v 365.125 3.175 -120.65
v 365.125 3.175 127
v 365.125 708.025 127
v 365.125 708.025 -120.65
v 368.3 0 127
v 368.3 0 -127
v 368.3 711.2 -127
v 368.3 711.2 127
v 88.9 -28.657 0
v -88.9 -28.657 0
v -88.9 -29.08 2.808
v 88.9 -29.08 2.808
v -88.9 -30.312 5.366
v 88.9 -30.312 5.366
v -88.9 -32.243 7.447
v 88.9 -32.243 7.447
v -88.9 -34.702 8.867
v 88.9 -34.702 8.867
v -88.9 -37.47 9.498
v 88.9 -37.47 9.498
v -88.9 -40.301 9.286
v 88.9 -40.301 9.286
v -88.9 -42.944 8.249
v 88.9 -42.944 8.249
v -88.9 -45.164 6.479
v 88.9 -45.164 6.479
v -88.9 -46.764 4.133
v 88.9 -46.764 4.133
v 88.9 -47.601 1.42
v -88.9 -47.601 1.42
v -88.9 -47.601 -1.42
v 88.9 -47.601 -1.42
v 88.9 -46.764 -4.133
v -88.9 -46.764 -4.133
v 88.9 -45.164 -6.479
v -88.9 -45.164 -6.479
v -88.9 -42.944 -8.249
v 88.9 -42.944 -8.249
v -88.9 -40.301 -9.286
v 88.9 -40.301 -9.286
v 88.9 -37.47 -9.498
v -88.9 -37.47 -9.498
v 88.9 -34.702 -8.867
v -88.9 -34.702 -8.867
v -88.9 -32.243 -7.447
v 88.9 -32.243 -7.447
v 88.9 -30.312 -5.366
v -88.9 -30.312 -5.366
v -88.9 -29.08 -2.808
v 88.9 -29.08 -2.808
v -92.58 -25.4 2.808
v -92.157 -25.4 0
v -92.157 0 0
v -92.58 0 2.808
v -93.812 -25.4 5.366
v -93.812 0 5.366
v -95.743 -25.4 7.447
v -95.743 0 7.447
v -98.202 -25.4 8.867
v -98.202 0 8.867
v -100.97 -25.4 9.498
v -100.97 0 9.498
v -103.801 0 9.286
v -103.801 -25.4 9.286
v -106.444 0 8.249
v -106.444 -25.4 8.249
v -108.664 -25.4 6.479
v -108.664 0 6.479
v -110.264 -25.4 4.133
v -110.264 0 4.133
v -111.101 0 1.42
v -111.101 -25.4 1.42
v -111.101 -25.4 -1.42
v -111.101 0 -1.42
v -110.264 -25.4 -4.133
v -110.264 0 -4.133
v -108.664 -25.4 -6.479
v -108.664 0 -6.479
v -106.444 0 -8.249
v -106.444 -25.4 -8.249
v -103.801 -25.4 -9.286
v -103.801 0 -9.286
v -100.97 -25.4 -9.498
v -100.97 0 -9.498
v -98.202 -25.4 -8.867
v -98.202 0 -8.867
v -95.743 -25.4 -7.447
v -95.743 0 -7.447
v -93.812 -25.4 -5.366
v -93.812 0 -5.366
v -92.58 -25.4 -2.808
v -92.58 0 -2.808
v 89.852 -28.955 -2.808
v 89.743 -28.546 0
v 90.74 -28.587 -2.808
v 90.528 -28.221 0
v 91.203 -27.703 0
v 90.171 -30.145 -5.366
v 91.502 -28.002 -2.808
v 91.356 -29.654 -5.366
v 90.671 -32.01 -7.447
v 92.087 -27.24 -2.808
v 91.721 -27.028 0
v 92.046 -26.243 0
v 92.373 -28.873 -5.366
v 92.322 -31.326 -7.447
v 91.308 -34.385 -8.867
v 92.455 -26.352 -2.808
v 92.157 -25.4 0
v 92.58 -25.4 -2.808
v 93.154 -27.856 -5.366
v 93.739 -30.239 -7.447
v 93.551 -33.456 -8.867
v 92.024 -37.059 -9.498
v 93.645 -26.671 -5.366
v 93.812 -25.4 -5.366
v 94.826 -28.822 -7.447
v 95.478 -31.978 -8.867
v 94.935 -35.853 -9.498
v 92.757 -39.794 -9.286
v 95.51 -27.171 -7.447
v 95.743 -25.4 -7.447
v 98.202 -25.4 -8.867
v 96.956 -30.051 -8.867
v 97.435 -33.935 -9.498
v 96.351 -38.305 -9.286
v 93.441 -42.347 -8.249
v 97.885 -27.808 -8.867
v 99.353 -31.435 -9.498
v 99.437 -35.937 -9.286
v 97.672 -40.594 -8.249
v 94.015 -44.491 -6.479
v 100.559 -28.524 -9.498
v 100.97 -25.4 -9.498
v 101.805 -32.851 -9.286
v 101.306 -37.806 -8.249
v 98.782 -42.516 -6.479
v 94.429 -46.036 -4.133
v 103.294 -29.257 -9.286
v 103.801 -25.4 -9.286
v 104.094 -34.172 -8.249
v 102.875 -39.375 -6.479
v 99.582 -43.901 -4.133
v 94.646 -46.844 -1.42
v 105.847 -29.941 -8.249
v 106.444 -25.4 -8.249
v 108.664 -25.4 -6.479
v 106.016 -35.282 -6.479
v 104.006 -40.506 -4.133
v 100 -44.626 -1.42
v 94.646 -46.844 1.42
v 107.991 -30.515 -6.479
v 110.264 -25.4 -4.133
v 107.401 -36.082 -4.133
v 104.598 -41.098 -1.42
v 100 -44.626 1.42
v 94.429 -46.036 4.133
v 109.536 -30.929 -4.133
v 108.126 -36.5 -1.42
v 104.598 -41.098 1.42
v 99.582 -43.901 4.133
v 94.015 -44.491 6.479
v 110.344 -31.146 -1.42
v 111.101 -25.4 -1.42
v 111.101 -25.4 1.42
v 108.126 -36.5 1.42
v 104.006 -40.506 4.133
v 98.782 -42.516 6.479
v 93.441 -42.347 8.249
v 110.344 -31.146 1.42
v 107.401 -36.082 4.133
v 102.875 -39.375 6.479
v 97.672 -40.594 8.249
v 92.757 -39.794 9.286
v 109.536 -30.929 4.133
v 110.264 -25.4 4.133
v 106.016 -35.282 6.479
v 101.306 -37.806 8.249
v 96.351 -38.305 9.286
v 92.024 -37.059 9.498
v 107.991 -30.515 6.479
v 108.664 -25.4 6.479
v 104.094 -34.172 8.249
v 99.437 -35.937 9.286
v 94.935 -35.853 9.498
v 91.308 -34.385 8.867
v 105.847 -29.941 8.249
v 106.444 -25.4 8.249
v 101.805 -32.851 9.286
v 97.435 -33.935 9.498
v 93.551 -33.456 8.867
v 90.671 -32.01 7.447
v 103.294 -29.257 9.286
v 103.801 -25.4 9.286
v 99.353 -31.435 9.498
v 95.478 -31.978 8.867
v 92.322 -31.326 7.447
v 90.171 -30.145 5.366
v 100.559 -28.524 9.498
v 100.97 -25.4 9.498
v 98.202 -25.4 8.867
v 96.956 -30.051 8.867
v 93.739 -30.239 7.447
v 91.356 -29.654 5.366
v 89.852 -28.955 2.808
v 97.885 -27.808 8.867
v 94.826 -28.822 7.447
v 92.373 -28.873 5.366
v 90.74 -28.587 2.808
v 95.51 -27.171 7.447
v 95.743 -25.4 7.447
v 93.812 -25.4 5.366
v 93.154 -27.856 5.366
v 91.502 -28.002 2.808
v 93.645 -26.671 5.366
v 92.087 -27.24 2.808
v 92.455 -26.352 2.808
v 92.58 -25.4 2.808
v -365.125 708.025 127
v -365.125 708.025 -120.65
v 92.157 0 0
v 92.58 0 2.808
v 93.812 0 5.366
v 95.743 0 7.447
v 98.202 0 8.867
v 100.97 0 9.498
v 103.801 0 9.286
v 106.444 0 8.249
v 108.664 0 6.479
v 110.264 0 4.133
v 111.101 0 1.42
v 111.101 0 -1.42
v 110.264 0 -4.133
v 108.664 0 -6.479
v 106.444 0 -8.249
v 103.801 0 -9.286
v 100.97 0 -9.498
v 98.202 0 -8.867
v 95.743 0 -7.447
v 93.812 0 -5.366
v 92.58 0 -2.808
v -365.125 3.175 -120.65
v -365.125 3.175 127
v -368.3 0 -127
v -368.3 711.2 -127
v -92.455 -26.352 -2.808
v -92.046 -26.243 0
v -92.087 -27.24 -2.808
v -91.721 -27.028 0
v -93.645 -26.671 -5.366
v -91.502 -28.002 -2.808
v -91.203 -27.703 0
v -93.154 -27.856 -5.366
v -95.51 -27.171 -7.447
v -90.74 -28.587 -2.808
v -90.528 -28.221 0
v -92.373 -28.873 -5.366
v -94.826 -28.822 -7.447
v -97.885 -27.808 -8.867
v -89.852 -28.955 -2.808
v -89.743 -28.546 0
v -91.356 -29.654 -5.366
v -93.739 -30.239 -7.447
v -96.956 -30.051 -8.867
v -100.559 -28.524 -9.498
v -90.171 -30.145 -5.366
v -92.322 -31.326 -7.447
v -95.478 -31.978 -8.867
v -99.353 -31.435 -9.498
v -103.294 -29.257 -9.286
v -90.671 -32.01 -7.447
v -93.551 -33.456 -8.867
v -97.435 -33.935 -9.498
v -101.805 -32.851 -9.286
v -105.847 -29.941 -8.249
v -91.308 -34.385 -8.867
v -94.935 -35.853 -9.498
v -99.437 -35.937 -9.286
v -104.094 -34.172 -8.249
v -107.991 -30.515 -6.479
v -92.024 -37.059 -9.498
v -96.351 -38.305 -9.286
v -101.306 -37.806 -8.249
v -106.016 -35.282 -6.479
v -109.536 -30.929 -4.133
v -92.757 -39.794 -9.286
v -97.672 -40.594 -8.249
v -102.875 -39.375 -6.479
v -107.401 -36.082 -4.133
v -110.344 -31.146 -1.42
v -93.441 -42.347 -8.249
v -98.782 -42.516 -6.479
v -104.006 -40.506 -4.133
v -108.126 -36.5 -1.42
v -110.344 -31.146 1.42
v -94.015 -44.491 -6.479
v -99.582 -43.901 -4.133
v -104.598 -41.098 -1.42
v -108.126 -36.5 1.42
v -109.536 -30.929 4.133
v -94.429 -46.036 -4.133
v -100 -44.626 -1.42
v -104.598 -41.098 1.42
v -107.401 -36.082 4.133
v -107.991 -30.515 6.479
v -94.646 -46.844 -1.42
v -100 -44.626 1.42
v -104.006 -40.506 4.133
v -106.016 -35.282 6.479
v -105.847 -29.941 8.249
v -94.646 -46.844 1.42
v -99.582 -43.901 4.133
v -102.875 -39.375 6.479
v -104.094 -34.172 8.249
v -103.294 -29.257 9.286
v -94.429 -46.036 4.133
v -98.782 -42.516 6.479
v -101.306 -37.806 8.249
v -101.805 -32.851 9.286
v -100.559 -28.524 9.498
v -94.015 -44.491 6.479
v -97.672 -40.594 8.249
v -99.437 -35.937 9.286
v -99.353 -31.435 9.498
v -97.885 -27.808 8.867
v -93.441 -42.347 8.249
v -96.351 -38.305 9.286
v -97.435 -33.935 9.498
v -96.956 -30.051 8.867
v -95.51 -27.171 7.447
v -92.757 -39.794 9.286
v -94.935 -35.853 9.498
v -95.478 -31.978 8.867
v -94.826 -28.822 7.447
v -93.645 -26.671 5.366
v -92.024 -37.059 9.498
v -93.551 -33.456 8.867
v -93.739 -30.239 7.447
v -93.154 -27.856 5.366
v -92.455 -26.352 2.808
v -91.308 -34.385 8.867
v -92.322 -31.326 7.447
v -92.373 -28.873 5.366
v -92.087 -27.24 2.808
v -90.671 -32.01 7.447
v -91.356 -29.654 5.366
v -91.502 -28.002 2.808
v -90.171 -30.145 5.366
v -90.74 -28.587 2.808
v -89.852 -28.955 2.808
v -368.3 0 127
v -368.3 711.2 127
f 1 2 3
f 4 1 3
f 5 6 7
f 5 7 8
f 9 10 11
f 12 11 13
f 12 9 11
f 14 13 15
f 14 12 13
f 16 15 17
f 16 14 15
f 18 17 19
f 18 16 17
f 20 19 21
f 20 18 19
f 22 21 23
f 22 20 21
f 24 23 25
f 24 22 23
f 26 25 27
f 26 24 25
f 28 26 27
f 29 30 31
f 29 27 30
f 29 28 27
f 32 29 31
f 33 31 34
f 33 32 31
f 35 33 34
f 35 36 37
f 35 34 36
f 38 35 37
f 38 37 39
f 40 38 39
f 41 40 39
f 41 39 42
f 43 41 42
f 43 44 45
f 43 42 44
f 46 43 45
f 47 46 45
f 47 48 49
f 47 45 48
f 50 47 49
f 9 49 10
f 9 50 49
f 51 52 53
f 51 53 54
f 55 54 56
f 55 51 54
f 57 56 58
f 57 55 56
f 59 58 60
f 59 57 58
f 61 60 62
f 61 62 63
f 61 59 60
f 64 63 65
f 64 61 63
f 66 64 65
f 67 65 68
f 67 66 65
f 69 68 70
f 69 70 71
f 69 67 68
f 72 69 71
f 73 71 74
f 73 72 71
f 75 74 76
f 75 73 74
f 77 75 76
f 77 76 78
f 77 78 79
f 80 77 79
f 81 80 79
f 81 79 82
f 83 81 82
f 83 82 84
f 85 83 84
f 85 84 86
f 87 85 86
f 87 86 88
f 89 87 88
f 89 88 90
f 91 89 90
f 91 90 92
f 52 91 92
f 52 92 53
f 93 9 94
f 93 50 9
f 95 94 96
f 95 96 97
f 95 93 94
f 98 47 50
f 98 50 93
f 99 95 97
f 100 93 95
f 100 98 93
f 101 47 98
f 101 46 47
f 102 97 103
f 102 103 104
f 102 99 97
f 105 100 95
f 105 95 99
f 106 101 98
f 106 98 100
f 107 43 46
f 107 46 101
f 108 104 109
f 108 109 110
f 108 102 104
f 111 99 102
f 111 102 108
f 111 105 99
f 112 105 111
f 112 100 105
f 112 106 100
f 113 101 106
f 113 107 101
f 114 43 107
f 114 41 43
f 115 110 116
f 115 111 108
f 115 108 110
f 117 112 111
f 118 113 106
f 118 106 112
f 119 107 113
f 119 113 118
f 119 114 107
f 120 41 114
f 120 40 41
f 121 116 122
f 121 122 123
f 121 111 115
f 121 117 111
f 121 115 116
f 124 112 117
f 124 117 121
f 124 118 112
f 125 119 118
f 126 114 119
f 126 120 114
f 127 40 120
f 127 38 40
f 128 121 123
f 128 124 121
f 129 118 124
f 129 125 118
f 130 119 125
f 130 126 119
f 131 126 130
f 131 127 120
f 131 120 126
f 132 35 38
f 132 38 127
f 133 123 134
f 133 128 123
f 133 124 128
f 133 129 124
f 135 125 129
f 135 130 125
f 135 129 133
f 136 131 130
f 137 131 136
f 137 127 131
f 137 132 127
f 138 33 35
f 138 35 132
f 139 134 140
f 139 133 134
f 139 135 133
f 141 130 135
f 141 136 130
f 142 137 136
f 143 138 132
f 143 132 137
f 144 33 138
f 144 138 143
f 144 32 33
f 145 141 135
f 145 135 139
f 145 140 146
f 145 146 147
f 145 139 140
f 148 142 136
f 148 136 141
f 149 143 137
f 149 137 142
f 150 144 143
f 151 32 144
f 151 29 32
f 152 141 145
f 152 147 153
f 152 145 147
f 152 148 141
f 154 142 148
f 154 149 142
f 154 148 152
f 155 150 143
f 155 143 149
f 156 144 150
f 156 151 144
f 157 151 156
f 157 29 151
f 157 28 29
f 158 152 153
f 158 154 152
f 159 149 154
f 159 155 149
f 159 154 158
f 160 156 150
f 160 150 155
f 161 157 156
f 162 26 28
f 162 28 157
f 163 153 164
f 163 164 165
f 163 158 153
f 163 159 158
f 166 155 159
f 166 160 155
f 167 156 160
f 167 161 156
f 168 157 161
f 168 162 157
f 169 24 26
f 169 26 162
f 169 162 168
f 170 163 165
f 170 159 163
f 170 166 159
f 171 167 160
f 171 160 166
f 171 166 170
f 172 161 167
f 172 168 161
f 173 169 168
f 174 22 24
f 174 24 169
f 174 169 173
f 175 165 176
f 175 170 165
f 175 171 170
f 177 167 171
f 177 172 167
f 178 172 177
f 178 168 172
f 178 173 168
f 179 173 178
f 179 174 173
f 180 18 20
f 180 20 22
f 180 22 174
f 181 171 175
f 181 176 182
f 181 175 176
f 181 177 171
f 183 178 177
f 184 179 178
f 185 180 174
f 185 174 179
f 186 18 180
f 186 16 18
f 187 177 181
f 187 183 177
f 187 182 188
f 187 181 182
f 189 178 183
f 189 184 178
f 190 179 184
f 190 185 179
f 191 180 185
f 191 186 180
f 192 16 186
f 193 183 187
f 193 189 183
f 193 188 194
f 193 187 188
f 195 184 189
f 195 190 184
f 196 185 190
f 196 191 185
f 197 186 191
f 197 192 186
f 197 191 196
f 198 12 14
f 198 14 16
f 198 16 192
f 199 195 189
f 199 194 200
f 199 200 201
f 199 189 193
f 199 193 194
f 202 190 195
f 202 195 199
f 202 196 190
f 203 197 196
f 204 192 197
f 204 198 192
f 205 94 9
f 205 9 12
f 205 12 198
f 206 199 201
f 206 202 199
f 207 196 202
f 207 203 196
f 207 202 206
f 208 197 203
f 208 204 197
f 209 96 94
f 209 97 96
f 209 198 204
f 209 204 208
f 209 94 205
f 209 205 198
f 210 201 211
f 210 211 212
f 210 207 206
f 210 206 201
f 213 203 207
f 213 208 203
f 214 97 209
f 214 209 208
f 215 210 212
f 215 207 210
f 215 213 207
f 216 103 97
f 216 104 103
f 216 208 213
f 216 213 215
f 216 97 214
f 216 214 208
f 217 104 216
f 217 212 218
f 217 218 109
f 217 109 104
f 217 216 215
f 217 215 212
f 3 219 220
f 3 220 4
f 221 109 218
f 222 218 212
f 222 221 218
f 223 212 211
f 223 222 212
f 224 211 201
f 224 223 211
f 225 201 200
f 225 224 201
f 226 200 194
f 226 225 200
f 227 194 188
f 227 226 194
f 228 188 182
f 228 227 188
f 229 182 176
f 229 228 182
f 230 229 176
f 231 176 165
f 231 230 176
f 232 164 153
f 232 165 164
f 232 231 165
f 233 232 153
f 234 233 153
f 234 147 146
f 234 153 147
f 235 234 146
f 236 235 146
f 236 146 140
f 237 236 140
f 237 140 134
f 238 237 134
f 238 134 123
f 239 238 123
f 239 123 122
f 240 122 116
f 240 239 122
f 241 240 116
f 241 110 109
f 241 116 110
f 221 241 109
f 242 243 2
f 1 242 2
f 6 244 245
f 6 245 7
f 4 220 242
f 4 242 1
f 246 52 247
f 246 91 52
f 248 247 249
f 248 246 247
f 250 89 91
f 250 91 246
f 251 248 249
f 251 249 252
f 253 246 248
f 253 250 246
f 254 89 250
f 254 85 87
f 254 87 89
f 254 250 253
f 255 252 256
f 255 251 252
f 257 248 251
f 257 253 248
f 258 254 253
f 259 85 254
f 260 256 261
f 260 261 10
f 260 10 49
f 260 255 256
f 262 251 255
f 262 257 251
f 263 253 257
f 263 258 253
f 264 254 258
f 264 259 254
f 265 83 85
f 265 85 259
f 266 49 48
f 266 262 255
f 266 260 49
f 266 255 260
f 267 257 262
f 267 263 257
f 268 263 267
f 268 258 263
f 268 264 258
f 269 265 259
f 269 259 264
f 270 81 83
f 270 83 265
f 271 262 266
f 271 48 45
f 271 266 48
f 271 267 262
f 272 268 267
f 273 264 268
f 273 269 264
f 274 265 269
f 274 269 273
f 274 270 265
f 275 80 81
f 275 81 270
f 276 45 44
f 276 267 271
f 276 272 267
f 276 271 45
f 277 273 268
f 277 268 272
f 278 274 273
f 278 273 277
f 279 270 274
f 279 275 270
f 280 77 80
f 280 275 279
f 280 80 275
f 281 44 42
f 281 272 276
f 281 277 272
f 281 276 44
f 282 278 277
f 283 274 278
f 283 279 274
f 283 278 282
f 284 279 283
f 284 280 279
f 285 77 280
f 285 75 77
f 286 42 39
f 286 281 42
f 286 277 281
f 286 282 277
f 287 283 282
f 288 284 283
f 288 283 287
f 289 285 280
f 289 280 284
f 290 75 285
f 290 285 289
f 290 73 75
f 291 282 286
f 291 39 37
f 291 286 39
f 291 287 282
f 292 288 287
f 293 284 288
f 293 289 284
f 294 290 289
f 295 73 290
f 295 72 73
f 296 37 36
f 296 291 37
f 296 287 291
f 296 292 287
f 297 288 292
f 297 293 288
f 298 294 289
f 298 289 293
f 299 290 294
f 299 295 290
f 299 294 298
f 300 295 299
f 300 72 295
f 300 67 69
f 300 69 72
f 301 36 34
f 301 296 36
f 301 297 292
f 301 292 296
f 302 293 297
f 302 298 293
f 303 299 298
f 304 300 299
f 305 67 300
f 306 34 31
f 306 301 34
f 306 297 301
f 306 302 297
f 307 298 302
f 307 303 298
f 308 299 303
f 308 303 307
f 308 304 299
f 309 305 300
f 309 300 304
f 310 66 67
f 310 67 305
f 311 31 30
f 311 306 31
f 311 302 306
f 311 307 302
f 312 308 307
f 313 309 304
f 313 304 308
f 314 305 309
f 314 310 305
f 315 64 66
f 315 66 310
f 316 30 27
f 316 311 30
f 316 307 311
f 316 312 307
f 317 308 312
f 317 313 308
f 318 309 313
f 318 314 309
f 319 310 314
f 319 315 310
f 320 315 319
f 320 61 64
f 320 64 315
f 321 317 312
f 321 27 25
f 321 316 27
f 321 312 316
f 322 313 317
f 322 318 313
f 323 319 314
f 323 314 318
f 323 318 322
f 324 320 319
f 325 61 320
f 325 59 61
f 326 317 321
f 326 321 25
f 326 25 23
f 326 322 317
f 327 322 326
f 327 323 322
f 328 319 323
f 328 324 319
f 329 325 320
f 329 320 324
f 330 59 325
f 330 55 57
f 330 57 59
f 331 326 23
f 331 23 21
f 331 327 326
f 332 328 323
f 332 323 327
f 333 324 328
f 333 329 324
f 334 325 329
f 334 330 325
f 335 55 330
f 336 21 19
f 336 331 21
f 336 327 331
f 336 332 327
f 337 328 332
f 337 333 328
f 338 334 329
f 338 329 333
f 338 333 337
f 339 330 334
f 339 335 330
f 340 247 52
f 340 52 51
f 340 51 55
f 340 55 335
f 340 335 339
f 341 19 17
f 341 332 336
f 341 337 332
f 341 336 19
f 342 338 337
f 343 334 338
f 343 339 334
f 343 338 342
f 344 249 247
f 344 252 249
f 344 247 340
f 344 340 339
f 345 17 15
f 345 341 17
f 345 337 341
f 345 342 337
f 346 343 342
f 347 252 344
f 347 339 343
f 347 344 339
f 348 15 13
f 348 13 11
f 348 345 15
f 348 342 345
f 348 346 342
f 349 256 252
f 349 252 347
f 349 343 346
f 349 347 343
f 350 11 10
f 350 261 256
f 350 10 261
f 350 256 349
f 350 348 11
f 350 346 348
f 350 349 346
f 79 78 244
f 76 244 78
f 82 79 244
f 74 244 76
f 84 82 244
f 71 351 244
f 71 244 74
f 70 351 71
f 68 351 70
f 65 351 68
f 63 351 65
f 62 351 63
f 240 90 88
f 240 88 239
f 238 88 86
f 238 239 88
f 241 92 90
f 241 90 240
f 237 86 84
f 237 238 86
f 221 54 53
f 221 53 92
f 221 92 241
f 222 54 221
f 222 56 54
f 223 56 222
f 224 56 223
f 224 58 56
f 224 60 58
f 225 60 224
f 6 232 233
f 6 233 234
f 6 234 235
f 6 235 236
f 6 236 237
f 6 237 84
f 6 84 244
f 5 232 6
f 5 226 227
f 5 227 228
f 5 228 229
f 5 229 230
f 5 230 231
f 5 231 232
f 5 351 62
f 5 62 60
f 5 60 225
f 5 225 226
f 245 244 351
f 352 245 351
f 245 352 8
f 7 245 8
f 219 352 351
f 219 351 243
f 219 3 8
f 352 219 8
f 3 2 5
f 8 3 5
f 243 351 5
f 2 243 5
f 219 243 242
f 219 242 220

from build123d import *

# Parameters (mm, degrees)
F0_W     = 736.6
F0_H     = 254
F1_DEPTH = 711.2
F2_W     = 730.25
F2_H     = 704.85
F3_DEPTH = 247.65
F5_R     = 9.525


with BuildPart() as f1:
    # F0 (on Front) → F1 (new body)
    with BuildSketch(Plane.XZ):
        Rectangle(F0_W, F0_H)
    extrude(amount=-F1_DEPTH)

    # F2 (on face) → F3 (cut)
    with BuildSketch(Plane.XY.offset(127)):
        with Locations((0, 355.6)):
            Rectangle(F2_W, F2_H)
    extrude(amount=-F3_DEPTH, mode=Mode.SUBTRACT)

    # F6: sweep along a path in F4
    with BuildLine(Plane.XY) as f6_path:
        Line((-101.6, 0), (-101.6, -25.4))
        ThreePointArc((-101.6, -25.4), (-97.8802561211, -34.3802561211), (-88.9, -38.1))
        Line((-88.9, -38.1), (88.9, -38.1))
        ThreePointArc((88.9, -38.1), (97.8802561211, -34.3802561211), (101.6, -25.4))
        Line((101.6, -25.4), (101.6, 0))
    # F5 (on face) → F6 (sweep)
    with BuildSketch(Plane.XZ):
        with Locations((-101.6819179058, 0)):
            Circle(F5_R)
    sweep(path=f6_path.line)


solid = f1.part
